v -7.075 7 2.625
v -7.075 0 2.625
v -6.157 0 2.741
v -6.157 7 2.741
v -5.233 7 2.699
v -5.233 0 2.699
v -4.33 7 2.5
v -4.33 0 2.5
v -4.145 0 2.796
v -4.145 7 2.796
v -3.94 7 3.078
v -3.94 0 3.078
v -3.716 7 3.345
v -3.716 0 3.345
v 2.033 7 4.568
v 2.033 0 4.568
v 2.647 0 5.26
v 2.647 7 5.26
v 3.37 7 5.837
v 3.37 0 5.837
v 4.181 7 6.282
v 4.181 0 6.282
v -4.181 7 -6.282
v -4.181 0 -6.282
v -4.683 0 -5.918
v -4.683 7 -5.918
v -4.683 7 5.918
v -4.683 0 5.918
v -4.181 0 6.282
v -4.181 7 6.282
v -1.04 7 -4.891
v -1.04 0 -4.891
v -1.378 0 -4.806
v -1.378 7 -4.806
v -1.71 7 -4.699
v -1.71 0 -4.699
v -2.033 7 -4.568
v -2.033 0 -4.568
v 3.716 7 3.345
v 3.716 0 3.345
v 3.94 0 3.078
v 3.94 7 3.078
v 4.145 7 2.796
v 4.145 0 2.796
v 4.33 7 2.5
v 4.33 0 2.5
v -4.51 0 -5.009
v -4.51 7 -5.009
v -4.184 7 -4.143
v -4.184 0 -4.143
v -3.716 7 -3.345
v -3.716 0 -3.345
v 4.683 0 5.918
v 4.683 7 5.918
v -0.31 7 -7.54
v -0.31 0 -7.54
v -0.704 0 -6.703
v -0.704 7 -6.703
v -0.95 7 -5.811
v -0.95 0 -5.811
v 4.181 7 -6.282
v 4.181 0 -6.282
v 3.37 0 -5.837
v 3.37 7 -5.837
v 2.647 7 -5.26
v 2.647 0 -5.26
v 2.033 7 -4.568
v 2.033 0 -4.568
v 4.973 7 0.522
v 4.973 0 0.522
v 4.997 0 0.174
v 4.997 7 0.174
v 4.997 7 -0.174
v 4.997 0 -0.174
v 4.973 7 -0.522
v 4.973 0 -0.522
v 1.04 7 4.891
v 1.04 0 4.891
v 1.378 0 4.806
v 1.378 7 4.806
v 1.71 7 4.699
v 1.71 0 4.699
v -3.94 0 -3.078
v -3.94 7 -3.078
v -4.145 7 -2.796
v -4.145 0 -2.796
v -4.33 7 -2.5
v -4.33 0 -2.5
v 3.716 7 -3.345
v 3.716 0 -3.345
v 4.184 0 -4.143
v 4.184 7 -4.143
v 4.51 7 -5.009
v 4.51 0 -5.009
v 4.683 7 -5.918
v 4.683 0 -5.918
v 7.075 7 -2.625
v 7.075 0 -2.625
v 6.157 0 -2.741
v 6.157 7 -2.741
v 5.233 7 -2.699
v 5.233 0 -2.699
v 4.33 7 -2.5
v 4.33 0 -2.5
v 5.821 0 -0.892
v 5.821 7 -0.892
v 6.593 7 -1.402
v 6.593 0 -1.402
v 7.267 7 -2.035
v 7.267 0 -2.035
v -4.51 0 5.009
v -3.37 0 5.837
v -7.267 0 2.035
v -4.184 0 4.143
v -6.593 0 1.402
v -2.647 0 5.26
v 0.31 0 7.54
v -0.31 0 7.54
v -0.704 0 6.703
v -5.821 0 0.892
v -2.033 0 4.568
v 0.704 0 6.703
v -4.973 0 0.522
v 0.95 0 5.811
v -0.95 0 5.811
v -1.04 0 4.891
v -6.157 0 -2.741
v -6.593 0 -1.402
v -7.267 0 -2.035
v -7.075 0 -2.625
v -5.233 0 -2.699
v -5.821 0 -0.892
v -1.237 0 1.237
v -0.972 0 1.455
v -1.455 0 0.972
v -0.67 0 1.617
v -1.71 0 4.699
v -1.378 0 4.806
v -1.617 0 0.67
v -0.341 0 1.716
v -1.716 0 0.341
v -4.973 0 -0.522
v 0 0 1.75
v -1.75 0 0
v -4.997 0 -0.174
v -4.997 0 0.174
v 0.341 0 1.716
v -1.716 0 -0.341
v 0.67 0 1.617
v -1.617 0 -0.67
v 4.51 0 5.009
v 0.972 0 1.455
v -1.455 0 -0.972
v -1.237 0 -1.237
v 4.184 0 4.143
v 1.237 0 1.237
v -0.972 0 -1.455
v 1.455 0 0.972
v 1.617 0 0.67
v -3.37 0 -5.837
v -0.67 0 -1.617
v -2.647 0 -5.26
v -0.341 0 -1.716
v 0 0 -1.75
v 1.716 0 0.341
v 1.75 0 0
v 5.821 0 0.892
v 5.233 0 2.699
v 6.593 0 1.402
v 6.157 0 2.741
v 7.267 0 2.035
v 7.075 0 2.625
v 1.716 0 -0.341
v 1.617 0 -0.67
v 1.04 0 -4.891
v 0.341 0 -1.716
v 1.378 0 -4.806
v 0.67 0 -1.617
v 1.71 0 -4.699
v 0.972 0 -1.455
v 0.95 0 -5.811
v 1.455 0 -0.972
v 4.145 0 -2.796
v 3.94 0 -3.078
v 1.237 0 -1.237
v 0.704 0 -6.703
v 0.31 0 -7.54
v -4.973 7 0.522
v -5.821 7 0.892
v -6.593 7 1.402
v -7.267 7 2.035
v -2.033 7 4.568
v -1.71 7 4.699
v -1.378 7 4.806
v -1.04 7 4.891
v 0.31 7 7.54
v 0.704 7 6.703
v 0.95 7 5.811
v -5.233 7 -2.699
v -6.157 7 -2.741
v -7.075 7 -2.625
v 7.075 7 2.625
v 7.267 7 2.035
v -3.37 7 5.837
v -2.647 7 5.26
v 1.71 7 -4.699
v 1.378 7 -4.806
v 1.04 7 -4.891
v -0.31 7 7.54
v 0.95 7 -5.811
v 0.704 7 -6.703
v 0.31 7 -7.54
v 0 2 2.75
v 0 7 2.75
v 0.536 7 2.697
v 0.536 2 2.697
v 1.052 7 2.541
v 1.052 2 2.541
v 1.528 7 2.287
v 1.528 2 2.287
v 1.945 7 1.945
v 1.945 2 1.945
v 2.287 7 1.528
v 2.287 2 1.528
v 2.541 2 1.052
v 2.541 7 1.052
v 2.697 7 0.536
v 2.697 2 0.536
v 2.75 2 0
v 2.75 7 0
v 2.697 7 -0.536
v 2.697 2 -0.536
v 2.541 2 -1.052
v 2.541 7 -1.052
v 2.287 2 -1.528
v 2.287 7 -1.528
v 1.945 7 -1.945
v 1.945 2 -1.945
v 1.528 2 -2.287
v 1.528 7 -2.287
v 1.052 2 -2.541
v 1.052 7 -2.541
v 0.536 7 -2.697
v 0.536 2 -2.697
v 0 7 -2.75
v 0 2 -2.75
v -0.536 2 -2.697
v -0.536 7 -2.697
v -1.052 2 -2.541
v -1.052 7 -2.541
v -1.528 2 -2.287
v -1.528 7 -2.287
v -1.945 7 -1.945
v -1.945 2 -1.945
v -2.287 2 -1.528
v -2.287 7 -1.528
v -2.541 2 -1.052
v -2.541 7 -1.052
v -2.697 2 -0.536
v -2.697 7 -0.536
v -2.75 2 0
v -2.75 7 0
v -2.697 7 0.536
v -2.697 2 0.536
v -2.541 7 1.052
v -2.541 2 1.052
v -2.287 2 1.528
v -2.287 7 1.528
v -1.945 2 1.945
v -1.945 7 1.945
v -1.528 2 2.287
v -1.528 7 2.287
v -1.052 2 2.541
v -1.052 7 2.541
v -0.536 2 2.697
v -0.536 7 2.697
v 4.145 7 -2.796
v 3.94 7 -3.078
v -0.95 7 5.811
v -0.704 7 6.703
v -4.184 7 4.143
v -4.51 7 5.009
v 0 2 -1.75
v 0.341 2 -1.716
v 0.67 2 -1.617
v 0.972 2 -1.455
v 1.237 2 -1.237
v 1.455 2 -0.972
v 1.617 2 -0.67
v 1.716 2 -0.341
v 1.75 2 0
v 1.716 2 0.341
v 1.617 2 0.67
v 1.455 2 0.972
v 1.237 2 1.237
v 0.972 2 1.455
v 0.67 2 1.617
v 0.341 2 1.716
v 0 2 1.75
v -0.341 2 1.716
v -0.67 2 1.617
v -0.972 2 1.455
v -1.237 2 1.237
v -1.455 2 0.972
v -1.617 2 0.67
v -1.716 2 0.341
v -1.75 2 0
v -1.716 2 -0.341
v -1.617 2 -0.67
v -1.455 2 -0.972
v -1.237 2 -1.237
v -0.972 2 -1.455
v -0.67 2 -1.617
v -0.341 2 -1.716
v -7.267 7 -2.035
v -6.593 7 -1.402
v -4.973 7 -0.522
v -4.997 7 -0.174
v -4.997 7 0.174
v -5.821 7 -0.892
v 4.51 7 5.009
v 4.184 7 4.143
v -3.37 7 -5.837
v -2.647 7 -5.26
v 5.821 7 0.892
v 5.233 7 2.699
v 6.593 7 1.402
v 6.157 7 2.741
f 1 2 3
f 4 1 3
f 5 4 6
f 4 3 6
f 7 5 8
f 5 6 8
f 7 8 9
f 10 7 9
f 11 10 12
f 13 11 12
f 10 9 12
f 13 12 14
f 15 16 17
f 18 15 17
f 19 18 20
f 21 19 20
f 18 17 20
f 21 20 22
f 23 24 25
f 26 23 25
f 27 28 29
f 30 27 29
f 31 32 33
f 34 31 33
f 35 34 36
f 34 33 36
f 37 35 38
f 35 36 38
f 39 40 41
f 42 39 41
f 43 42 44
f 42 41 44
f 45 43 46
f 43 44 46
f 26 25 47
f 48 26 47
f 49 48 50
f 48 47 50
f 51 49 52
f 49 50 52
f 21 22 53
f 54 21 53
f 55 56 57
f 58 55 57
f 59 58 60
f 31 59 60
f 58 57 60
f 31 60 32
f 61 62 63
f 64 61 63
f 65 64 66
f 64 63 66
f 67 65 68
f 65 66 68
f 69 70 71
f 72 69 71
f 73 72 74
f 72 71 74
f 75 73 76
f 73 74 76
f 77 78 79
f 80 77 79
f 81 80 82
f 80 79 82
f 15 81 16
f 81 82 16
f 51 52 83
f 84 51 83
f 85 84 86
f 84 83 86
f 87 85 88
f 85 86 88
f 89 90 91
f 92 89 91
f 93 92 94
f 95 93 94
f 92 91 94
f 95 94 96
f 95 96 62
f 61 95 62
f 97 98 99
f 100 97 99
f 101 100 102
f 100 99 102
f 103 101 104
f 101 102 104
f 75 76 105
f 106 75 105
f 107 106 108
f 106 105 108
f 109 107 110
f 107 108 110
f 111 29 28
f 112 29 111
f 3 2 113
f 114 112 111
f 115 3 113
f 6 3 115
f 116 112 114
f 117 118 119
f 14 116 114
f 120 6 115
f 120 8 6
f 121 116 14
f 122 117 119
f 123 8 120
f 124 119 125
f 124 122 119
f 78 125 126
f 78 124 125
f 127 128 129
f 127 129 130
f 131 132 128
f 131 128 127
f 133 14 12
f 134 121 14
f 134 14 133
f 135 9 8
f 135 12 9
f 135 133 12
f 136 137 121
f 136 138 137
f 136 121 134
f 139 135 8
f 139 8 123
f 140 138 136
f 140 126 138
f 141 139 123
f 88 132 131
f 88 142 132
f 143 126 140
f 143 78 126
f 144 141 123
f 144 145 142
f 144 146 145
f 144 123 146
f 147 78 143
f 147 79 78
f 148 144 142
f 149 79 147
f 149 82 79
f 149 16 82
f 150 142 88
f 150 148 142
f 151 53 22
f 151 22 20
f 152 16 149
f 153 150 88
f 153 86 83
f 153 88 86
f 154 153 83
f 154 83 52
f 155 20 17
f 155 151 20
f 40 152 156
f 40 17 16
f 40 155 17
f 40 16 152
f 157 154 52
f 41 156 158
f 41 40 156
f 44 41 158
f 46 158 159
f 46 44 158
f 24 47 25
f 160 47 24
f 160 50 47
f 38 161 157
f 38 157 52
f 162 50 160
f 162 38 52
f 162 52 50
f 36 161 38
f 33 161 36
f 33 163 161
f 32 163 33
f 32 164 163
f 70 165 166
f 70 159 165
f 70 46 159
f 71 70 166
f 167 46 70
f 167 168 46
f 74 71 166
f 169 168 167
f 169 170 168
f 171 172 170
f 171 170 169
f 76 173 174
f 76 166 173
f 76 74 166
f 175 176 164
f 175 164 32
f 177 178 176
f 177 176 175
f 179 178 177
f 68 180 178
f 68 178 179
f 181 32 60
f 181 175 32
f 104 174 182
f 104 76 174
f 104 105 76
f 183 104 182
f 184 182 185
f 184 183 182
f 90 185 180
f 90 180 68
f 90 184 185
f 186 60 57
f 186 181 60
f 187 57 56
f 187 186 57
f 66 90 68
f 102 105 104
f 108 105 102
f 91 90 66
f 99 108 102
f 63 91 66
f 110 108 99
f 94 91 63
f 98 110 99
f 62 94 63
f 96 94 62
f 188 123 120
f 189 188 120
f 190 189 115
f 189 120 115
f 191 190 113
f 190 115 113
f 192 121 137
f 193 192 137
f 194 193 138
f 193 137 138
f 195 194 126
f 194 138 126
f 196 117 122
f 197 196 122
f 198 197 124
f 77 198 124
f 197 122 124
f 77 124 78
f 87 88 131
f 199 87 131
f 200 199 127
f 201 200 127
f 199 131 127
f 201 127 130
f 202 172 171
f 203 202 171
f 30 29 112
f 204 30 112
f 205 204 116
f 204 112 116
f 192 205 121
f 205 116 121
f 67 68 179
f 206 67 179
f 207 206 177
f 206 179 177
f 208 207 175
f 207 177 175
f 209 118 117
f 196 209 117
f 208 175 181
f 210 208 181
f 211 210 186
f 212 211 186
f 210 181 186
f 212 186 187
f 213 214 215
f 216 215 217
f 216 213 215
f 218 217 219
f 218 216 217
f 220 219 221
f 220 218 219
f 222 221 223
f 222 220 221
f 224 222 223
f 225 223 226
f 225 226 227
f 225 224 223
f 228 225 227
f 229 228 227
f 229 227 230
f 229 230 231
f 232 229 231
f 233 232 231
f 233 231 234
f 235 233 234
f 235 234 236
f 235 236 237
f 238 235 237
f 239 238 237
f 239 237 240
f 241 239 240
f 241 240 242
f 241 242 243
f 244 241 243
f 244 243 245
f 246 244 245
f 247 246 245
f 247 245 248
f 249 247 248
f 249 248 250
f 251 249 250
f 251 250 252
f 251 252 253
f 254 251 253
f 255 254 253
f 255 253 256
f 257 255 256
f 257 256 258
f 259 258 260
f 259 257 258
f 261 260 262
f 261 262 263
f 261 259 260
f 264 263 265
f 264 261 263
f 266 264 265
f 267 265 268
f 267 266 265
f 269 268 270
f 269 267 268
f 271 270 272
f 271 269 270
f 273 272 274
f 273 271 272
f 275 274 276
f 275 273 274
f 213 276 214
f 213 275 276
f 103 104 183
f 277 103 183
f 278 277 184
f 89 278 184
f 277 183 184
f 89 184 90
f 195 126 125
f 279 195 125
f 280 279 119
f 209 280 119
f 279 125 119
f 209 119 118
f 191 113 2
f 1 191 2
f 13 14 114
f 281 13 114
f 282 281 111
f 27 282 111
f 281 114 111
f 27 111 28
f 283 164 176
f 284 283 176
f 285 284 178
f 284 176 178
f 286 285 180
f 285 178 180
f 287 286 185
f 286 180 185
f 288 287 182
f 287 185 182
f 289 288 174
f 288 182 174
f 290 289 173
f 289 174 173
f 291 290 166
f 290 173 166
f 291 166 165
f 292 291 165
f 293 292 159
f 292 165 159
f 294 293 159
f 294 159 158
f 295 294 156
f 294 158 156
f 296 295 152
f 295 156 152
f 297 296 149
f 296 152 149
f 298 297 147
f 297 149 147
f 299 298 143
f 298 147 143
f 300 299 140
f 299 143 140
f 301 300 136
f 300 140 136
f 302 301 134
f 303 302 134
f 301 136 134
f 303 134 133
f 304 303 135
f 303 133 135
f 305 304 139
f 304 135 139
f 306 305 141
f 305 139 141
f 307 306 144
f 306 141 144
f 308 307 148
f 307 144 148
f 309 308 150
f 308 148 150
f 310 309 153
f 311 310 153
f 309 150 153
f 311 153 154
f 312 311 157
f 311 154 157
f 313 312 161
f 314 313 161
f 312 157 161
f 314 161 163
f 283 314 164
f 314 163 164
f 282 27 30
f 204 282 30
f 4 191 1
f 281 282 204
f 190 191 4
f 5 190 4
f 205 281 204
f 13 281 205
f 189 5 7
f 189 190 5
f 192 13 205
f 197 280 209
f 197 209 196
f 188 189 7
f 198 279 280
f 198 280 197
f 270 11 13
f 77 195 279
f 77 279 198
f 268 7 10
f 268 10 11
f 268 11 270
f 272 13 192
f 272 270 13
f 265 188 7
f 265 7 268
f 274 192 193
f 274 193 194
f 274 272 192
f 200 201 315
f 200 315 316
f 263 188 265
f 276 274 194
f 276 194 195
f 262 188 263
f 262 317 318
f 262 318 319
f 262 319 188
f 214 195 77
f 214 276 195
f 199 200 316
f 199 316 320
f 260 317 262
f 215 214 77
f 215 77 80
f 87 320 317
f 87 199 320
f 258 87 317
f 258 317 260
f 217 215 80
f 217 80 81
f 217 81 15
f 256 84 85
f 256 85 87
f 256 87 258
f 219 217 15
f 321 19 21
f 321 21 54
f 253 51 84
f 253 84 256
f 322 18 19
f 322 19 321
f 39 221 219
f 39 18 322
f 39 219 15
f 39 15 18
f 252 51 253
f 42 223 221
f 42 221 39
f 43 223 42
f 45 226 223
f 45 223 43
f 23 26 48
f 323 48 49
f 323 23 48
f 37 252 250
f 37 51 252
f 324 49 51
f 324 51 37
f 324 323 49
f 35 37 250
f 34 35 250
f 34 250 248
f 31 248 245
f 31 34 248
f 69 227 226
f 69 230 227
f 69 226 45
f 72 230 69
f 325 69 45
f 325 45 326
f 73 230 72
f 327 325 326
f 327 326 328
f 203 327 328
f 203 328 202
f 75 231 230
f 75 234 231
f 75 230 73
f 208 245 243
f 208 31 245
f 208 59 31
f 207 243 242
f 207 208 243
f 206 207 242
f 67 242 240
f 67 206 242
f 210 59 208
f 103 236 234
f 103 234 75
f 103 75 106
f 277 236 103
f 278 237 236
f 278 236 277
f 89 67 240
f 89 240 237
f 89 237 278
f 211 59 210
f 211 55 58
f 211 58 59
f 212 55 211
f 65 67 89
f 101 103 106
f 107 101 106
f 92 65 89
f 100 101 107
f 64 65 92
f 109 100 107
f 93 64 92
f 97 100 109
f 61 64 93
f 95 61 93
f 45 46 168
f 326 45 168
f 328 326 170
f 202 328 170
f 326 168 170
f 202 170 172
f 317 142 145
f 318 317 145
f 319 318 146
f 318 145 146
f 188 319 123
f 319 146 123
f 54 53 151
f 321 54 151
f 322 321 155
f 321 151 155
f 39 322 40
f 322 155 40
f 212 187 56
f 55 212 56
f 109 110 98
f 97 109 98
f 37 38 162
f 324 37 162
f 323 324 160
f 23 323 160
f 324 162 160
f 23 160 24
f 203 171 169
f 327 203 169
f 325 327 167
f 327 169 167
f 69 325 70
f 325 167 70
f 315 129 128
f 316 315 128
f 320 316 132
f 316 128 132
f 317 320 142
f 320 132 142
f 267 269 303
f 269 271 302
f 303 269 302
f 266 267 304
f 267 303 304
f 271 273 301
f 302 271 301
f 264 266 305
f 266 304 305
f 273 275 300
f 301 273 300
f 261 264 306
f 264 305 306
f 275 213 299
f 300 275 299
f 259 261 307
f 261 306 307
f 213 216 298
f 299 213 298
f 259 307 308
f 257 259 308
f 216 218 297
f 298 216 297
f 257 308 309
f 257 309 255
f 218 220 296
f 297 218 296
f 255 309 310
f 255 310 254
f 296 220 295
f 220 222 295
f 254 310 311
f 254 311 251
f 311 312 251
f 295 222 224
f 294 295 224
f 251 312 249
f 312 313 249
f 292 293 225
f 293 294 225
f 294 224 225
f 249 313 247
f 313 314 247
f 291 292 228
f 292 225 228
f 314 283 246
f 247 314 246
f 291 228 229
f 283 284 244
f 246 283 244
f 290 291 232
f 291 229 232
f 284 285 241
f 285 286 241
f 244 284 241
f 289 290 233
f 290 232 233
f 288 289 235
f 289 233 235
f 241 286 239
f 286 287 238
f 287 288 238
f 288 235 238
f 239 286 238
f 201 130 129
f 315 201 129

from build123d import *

# Parameters (mm, degrees)
SKETCH1_R           = 2.75
BOSS_EXTRUDE1_DEPTH = 7
SKETCH2_R           = 2.75
SKETCH2_R_2         = 1.75
BOSS_EXTRUDE2_DEPTH = 2


with BuildPart() as part:
    # Sketch1 → Boss-Extrude1 (new body)
    with BuildSketch(Plane(origin=(0, 0, 0), x_dir=(1, 0, 0), z_dir=(0, 1, 0))):
        with BuildLine():
            ThreePointArc((-1.04, 4.890644129), (-1.545084972, 4.755282581), (-2.033270819, 4.567910876))
            ThreePointArc((-2.033270819, 4.567910876), (-2.996312027, 5.563972943), (-4.181105534, 6.282201566))
            Line((-4.181105534, 6.282201566), (-4.682696071, 5.917774709))
            ThreePointArc((-4.682696071, 5.917774709), (-4.365741387, 4.569024274), (-3.716026168, 3.345317552))
            ThreePointArc((-3.716026168, 3.345317552), (-4.045084972, 2.938926261), (-4.329901294, 2.500390926))
            ThreePointArc((-4.329901294, 2.500390926), (-5.69448859, 2.740160647), (-7.075170865, 2.624815658))
            Line((-7.075170865, 2.624815658), (-7.266761401, 2.035160618))
            ThreePointArc((-7.266761401, 2.035160618), (-6.217564061, 1.130299882), (-4.972656642, 0.522193372))
            ThreePointArc((-4.972656642, 0.522193372), (-5, 0), (-4.972656642, -0.522193372))
            ThreePointArc((-4.972656642, -0.522193372), (-6.217564061, -1.130299882), (-7.266761401, -2.035160618))
            Line((-7.266761401, -2.035160618), (-7.075170865, -2.624815658))
            ThreePointArc((-7.075170865, -2.624815658), (-5.69448859, -2.740160647), (-4.329901294, -2.500390926))
            ThreePointArc((-4.329901294, -2.500390926), (-4.045084972, -2.938926261), (-3.716026168, -3.345317552))
            ThreePointArc((-3.716026168, -3.345317552), (-4.365741387, -4.569024274), (-4.682696071, -5.917774709))
            Line((-4.682696071, -5.917774709), (-4.181105534, -6.282201566))
            ThreePointArc((-4.181105534, -6.282201566), (-2.996312027, -5.563972943), (-2.033270819, -4.567910876))
            ThreePointArc((-2.033270819, -4.567910876), (-1.545084972, -4.755282581), (-1.04, -4.890644129))
            ThreePointArc((-1.04, -4.890644129), (-0.84635389, -6.262536688), (-0.31, -7.54))
            Line((-0.31, -7.54), (0.31, -7.54))
            ThreePointArc((0.31, -7.54), (0.84635389, -6.262536688), (1.04, -4.890644129))
            ThreePointArc((1.04, -4.890644129), (1.545084972, -4.755282581), (2.033270819, -4.567910876))
            ThreePointArc((2.033270819, -4.567910876), (2.996312027, -5.563972943), (4.181105534, -6.282201566))
            Line((4.181105534, -6.282201566), (4.682696071, -5.917774709))
            ThreePointArc((4.682696071, -5.917774709), (4.365741387, -4.569024274), (3.716026168, -3.345317552))
            ThreePointArc((3.716026168, -3.345317552), (4.045084972, -2.938926261), (4.329901294, -2.500390926))
            ThreePointArc((4.329901294, -2.500390926), (5.69448859, -2.740160647), (7.075170865, -2.624815658))
            Line((7.075170865, -2.624815658), (7.266761401, -2.035160618))
            ThreePointArc((7.266761401, -2.035160618), (6.217564061, -1.130299882), (4.972656642, -0.522193372))
            ThreePointArc((4.972656642, -0.522193372), (5, 0), (4.972656642, 0.522193372))
            ThreePointArc((4.972656642, 0.522193372), (6.217564061, 1.130299882), (7.266761401, 2.035160618))
            Line((7.266761401, 2.035160618), (7.075170865, 2.624815658))
            ThreePointArc((7.075170865, 2.624815658), (5.69448859, 2.740160647), (4.329901294, 2.500390926))
            ThreePointArc((4.329901294, 2.500390926), (4.045084972, 2.938926261), (3.716026168, 3.345317552))
            ThreePointArc((3.716026168, 3.345317552), (4.365741387, 4.569024274), (4.682696071, 5.917774709))
            Line((4.682696071, 5.917774709), (4.181105534, 6.282201566))
            ThreePointArc((4.181105534, 6.282201566), (2.996312027, 5.563972943), (2.033270819, 4.567910876))
            ThreePointArc((2.033270819, 4.567910876), (1.545084972, 4.755282581), (1.04, 4.890644129))
            ThreePointArc((1.04, 4.890644129), (0.84635389, 6.262536688), (0.31, 7.54))
            Line((0.31, 7.54), (-0.31, 7.54))
            ThreePointArc((-0.31, 7.54), (-0.84635389, 6.262536688), (-1.04, 4.890644129))
        make_face()
        with Locations(Location((0, 0, 0), (0, 0, 270))):
            Circle(SKETCH1_R, mode=Mode.SUBTRACT)
    extrude(amount=BOSS_EXTRUDE1_DEPTH)

    # Sketch2 → Boss-Extrude2 (add)
    with BuildSketch(Plane.XZ):
        with Locations(Location((0, 0, 0), (0, 0, 270))):
            Circle(SKETCH2_R)
        with Locations(Location((0, 0, 0), (0, 0, 270))):
            Circle(SKETCH2_R_2, mode=Mode.SUBTRACT)
    extrude(amount=-BOSS_EXTRUDE2_DEPTH)


solid = part.part
